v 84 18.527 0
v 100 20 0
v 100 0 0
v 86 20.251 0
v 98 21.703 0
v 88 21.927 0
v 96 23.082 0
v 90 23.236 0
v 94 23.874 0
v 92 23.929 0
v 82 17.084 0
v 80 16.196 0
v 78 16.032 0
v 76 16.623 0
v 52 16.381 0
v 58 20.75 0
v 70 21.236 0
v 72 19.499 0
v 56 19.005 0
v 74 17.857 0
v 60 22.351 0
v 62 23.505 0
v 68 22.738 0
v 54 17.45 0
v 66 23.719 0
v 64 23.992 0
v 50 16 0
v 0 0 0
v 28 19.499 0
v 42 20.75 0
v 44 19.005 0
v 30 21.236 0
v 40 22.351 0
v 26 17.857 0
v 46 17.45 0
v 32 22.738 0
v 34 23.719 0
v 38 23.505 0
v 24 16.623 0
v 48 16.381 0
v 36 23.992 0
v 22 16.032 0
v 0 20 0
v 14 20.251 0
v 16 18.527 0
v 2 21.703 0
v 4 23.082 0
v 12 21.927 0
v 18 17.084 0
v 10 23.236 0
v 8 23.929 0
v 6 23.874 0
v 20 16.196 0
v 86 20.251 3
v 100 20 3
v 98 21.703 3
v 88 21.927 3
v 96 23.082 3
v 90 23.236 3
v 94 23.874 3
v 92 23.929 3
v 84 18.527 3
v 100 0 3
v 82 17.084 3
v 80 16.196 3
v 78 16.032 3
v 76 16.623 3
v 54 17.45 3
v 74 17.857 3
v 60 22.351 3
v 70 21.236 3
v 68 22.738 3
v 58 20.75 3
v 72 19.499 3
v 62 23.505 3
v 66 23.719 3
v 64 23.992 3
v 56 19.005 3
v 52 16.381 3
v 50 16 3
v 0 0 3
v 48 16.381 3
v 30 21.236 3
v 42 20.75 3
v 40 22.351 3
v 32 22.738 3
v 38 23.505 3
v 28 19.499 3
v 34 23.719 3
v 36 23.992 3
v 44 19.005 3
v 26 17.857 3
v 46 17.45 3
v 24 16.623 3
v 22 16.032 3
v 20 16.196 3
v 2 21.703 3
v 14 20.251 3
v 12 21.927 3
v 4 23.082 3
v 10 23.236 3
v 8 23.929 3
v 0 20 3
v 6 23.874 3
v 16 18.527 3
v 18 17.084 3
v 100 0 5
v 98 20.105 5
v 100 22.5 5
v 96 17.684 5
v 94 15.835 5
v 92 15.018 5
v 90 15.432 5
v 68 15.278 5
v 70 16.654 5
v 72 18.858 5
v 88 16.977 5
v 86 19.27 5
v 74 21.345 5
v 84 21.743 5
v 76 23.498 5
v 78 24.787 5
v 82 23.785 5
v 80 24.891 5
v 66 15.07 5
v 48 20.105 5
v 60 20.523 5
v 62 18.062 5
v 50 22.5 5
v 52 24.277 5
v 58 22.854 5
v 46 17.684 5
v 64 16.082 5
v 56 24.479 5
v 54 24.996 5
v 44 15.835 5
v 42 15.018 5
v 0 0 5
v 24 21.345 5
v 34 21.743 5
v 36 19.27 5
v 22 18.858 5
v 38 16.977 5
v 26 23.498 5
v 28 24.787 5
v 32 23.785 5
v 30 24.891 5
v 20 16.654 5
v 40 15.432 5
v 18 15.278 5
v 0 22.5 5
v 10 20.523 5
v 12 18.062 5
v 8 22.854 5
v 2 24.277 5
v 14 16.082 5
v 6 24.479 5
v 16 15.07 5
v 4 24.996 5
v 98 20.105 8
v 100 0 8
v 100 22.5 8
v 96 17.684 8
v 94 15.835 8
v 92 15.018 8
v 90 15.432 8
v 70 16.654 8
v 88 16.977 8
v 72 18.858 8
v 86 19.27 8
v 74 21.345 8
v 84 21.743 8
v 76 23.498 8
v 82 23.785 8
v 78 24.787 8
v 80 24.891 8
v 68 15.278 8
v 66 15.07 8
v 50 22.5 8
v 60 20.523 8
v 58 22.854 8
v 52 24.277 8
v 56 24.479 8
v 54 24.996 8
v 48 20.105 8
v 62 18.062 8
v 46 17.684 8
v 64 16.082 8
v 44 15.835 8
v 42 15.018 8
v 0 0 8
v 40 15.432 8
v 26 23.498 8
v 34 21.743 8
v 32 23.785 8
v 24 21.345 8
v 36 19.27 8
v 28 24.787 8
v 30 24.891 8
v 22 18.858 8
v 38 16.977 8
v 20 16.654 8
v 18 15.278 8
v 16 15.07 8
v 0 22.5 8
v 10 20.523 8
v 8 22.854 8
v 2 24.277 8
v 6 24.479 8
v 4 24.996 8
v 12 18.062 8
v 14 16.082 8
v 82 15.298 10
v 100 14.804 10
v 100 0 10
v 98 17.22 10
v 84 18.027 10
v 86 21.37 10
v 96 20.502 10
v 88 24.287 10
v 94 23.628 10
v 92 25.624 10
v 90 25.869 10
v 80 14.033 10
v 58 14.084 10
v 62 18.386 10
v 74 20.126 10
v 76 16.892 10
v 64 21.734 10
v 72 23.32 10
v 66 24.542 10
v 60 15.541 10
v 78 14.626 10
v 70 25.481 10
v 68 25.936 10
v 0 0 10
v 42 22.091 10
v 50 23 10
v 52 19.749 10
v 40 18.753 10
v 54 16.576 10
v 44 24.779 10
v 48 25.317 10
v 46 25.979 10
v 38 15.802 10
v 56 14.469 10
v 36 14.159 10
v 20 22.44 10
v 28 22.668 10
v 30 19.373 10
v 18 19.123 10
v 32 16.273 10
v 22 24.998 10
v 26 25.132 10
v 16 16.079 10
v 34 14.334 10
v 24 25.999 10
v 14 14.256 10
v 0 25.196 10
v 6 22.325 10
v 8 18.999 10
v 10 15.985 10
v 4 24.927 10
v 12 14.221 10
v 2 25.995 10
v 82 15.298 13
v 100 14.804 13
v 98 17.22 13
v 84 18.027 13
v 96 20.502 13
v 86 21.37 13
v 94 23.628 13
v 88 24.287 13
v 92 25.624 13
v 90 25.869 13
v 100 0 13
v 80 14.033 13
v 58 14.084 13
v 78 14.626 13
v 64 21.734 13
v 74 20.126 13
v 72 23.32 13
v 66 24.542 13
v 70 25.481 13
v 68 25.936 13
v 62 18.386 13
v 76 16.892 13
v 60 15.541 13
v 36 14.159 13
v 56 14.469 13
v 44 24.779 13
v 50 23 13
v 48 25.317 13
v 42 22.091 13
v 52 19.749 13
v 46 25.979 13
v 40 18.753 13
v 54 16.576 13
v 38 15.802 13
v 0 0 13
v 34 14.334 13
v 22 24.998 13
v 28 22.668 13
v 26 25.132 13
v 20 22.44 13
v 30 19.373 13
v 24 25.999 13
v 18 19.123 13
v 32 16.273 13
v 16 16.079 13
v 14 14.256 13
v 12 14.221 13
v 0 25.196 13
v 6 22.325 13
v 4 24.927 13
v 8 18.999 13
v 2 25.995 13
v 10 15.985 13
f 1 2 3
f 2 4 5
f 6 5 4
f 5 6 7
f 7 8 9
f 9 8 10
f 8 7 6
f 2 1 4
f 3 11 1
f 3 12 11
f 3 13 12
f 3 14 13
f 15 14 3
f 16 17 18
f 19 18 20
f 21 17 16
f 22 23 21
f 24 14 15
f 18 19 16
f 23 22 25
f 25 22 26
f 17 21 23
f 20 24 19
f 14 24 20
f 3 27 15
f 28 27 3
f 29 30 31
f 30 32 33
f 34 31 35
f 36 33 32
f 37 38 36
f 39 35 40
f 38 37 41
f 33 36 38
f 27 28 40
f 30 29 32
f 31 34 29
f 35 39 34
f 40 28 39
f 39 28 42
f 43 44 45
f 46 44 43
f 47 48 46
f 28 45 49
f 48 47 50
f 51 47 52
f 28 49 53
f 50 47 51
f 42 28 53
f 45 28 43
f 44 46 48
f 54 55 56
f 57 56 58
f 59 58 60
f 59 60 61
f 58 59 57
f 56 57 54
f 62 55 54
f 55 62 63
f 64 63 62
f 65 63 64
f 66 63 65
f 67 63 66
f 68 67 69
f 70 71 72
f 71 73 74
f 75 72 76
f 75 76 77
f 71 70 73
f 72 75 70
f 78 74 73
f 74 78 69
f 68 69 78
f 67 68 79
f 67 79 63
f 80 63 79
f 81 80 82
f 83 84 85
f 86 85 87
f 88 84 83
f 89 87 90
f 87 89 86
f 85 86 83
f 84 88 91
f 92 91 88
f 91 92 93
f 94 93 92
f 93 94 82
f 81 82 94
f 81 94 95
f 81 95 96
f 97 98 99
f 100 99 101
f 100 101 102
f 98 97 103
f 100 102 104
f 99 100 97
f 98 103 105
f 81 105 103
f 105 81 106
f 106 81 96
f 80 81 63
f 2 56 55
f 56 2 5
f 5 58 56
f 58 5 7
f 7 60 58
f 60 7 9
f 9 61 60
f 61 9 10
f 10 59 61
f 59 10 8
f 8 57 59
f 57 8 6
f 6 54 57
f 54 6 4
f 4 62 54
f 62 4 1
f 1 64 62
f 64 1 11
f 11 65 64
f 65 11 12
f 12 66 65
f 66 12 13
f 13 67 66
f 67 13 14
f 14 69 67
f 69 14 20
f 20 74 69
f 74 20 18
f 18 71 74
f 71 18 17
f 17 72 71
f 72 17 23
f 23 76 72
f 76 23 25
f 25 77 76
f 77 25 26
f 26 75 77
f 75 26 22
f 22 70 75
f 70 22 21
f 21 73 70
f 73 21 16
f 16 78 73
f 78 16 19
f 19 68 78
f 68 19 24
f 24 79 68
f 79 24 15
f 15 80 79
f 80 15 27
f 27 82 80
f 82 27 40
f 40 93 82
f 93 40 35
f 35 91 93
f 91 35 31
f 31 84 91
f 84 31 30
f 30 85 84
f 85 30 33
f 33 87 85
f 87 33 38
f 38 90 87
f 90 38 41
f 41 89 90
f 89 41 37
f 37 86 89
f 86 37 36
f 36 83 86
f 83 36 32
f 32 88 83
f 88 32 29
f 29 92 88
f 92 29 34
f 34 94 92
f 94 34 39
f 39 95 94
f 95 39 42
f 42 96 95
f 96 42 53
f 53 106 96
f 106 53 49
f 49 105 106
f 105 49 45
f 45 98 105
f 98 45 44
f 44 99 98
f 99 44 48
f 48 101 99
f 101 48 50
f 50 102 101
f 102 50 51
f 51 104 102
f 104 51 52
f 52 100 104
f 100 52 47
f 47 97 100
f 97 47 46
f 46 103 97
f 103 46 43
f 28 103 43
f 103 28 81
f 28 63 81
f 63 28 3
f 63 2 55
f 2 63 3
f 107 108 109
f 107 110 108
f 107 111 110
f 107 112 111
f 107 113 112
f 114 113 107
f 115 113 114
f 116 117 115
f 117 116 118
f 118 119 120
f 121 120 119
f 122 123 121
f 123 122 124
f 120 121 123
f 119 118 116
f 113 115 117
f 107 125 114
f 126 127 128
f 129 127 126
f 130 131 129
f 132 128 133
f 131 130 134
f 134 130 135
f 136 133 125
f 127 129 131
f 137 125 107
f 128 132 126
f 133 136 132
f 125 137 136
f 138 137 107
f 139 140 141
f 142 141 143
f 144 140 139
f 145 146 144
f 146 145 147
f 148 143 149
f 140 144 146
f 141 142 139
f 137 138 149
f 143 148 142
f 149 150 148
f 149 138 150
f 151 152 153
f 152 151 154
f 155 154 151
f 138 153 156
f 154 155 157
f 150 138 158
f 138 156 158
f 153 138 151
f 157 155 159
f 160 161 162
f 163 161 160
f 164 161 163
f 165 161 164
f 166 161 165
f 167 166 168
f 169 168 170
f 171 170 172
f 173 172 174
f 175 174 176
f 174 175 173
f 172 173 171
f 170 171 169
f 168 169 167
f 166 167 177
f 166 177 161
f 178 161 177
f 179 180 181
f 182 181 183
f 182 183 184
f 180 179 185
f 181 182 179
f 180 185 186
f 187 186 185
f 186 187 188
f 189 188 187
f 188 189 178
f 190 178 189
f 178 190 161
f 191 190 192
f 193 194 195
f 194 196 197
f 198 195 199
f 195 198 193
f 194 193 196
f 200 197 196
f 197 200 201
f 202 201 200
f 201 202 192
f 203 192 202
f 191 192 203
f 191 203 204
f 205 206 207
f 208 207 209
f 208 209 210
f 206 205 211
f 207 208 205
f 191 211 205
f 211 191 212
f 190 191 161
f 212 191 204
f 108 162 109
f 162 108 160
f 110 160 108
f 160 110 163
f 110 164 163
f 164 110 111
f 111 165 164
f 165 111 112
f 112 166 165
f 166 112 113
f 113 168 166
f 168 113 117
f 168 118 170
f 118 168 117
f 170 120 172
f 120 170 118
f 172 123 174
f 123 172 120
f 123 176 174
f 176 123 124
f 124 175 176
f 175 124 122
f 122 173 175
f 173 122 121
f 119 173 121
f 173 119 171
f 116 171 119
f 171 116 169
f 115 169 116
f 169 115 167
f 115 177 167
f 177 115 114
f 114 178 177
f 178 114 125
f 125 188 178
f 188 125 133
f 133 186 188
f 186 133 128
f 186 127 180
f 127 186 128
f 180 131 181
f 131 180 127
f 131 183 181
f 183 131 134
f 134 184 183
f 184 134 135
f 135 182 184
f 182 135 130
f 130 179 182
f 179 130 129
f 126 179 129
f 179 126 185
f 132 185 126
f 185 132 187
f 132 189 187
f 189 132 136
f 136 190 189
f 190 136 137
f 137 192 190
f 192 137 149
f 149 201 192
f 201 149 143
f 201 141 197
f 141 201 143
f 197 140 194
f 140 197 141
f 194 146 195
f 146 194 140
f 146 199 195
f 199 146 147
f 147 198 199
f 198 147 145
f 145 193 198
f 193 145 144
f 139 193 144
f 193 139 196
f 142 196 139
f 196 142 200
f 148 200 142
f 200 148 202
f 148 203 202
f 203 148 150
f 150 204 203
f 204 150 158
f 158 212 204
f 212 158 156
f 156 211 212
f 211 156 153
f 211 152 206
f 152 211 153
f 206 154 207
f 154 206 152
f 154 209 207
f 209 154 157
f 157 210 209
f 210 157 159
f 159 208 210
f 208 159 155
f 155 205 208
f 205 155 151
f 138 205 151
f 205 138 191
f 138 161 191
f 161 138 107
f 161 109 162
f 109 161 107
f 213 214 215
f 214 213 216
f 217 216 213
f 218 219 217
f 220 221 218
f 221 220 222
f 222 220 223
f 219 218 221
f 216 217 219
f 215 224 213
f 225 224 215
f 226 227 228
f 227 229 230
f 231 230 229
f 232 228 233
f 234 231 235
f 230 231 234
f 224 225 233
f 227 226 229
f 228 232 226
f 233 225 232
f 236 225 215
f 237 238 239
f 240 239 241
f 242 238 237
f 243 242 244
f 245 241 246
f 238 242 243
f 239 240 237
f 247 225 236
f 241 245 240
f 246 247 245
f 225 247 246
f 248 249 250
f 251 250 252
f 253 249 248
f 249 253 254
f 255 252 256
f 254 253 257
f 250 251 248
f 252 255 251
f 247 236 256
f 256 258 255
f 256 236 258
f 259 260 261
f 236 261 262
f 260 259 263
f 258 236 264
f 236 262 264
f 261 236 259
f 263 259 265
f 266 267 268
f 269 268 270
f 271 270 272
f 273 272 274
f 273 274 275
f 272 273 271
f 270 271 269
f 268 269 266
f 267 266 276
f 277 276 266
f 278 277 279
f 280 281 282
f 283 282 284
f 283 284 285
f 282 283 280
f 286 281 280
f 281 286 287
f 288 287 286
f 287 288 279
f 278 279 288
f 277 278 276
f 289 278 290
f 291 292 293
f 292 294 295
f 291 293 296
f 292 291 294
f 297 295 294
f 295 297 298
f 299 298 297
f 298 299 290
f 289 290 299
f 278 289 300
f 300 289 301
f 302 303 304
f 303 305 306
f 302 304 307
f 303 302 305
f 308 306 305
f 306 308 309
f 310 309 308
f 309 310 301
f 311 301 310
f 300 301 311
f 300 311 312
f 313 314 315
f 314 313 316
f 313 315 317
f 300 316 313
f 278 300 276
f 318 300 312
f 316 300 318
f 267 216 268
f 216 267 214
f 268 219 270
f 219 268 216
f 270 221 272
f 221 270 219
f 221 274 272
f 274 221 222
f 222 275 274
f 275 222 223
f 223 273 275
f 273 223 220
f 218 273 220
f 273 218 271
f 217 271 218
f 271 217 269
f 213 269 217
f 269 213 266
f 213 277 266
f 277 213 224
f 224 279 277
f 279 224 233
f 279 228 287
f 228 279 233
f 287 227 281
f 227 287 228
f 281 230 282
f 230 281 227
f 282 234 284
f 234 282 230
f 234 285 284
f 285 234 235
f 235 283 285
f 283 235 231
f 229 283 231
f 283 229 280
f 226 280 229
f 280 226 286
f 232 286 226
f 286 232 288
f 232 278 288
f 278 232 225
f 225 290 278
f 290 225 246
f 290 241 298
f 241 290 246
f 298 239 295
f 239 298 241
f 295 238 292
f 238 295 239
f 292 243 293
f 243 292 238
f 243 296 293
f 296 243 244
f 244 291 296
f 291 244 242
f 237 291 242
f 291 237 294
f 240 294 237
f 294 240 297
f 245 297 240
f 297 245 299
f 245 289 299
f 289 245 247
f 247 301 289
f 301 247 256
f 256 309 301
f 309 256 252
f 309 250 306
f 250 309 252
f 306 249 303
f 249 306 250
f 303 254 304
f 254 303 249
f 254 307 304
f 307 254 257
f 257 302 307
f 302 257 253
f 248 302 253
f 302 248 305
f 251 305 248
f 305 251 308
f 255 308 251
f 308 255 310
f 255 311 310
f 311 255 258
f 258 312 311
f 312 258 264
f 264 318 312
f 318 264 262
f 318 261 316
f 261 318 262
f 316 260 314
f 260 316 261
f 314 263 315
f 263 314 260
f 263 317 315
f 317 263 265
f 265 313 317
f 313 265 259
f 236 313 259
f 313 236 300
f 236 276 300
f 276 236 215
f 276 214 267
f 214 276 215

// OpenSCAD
// =============================================================================
// OCEAN WAVE LAYERS - Print Parts Selector
// Starry Night Kinetic Sculpture - Static Decorative Elements
// =============================================================================
// Use PART_SELECT to choose which part to render for printing
// =============================================================================

// PART SELECTION
// 0 = All layers stacked (reference view only - not for printing)
// 1 = Layer 1 only (darkest blue - base)
// 2 = Layer 2 only (medium blue - middle)
// 3 = Layer 3 only (lightest blue - top)
PART_SELECT = 0;

// =============================================================================
// INCLUDE STANDALONE DEFINITIONS
// =============================================================================

$fn = 64;

// Layer dimensions
WAVE_WIDTH = 100;
WAVE_DEPTH = 40;
WAVE_THICKNESS = 3;

// Z positions (only used for assembled view)
L1_Z = 0;
L2_Z = 5;
L3_Z = 10;

// Wave profile parameters
L1_AMPLITUDE = 4;
L1_FREQUENCY = 3.5;
L1_PHASE = 0;

L2_AMPLITUDE = 5;
L2_FREQUENCY = 4.0;
L2_PHASE = 30;

L3_AMPLITUDE = 6;
L3_FREQUENCY = 4.5;
L3_PHASE = 60;

// Colors
L1_COLOR = [0.1, 0.2, 0.5];
L2_COLOR = [0.2, 0.4, 0.7];
L3_COLOR = [0.4, 0.6, 0.9];

WAVE_RESOLUTION = 2;

// =============================================================================
// WAVE LAYER MODULE
// =============================================================================

module wave_layer(width, depth, thickness, amplitude, frequency, phase=0) {
    ang_freq = frequency * 360 / width;

    linear_extrude(height = thickness) {
        polygon(
            concat(
                [for (x = [0 : WAVE_RESOLUTION : width])
                    [x, depth/2 + amplitude * sin(x * ang_freq + phase)]
                ],
                [[width, depth/2 + amplitude * sin(width * ang_freq + phase)]],
                [[width, 0]],
                [[0, 0]]
            )
        );
    }
}

// =============================================================================
// PRINT-READY MODULES (at Z=0 for slicing)
// =============================================================================

// Layer 1 - positioned at Z=0 for printing
module print_L1() {
    color(L1_COLOR)
    wave_layer(
        width = WAVE_WIDTH,
        depth = WAVE_DEPTH,
        thickness = WAVE_THICKNESS,
        amplitude = L1_AMPLITUDE,
        frequency = L1_FREQUENCY,
        phase = L1_PHASE
    );
}

// Layer 2 - positioned at Z=0 for printing
module print_L2() {
    color(L2_COLOR)
    wave_layer(
        width = WAVE_WIDTH,
        depth = WAVE_DEPTH,
        thickness = WAVE_THICKNESS,
        amplitude = L2_AMPLITUDE,
        frequency = L2_FREQUENCY,
        phase = L2_PHASE
    );
}

// Layer 3 - positioned at Z=0 for printing
module print_L3() {
    color(L3_COLOR)
    wave_layer(
        width = WAVE_WIDTH,
        depth = WAVE_DEPTH,
        thickness = WAVE_THICKNESS,
        amplitude = L3_AMPLITUDE,
        frequency = L3_FREQUENCY,
        phase = L3_PHASE
    );
}

// Assembled reference view
module assembled_reference() {
    translate([0, 0, L1_Z]) print_L1();
    translate([0, 0, L2_Z]) print_L2();
    translate([0, 0, L3_Z]) print_L3();
}

// =============================================================================
// PART SELECTOR
// =============================================================================

if (PART_SELECT == 0) {
    // Reference view - all layers stacked
    assembled_reference();
} else if (PART_SELECT == 1) {
    // Layer 1 only - print ready at Z=0
    print_L1();
} else if (PART_SELECT == 2) {
    // Layer 2 only - print ready at Z=0
    print_L2();
} else if (PART_SELECT == 3) {
    // Layer 3 only - print ready at Z=0
    print_L3();
}

// =============================================================================
// PRINT INSTRUCTIONS
// =============================================================================
/*
PRINTING GUIDE:

1. Set PART_SELECT to desired layer (1, 2, or 3)
2. Render (F6) and export STL
3. Print flat on bed - no supports needed

RECOMMENDED FILAMENT COLORS:
- Layer 1: Dark navy blue (e.g., Prusament Galaxy Blue)
- Layer 2: Medium blue (e.g., Prusament Azure Blue)
- Layer 3: Light sky blue (e.g., Prusament Lipstick Red... just kidding, Light Blue)

PRINT SETTINGS:
- Layer height: 0.2mm
- Infill: 20% (these are thin, mostly perimeters)
- Perimeters: 3
- No supports needed

ASSEMBLY:
- Stack layers with L1 at bottom, L3 at top
- Use small dabs of glue or mounting tabs
- Or design a frame to hold all three
*/
// =============================================================================
